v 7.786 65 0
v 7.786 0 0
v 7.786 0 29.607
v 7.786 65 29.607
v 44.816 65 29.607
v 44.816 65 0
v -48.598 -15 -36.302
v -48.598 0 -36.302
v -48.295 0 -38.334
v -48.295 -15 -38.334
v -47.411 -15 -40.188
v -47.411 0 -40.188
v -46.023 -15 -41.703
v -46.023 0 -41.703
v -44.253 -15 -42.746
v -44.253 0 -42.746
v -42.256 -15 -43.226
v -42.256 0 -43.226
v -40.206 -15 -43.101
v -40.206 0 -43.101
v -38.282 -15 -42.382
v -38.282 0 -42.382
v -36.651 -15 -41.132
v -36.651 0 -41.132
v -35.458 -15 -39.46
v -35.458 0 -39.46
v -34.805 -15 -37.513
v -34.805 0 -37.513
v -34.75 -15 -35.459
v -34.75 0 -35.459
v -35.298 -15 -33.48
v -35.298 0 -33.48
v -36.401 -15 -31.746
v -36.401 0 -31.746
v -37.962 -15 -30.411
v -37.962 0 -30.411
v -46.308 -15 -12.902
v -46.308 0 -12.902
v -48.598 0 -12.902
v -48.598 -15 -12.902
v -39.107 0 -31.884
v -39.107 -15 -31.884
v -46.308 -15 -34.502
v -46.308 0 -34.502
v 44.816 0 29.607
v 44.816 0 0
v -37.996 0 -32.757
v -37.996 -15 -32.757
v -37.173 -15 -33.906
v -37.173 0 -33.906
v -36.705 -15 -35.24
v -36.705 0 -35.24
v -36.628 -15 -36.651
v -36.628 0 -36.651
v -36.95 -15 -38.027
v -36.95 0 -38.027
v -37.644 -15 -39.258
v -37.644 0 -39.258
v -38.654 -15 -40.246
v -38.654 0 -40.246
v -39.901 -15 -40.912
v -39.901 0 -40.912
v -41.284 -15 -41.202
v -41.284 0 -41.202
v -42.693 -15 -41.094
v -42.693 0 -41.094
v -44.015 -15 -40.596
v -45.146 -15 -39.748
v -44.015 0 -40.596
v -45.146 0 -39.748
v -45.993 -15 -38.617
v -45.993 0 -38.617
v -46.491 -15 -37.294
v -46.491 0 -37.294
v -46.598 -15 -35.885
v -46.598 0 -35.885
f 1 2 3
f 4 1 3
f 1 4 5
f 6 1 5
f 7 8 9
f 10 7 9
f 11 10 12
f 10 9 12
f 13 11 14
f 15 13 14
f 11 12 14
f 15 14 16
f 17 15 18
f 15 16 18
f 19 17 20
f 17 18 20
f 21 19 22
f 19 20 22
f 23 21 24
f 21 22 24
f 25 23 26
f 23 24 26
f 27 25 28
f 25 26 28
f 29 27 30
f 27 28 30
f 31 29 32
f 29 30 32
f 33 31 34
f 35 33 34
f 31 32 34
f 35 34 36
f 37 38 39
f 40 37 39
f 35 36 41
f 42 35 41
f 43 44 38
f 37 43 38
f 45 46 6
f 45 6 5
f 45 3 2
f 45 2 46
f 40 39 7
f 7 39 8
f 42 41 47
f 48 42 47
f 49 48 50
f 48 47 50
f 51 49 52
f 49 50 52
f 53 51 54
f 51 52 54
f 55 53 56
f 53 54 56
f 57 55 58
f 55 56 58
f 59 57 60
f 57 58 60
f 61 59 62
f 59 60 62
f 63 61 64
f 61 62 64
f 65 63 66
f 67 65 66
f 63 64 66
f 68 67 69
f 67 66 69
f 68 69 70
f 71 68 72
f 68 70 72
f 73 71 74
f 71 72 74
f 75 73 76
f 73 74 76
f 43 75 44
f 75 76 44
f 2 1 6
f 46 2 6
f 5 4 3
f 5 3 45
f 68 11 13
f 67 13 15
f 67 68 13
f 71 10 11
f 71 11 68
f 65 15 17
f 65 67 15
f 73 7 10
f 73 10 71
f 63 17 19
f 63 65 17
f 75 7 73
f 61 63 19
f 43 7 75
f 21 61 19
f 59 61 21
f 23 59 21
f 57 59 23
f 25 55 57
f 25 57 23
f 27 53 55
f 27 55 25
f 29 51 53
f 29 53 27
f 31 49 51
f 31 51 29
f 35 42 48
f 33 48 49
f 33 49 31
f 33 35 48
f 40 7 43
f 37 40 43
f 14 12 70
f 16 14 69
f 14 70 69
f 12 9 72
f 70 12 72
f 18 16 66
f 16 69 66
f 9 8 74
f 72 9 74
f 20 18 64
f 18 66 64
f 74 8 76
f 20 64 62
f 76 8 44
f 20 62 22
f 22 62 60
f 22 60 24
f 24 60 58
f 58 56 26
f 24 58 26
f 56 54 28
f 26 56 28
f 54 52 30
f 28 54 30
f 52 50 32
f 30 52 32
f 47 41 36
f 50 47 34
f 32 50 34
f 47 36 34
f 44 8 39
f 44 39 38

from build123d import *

# Parameters (mm, degrees)
F1_DEPTH = 15
F3_W     = 37.029528
F3_H     = 29.607106
F2_DEPTH = 65


with BuildPart() as f1:
    # F0 (on Front) → F1 (new body)
    with BuildSketch(Plane.XZ):
        with BuildLine():
            Line((-46.307503, -12.901538), (-48.598494, -12.901538))
            Line((-48.598494, -12.901538), (-48.598494, -36.302392))
            ThreePointArc((-48.598494, -36.302392), (-38.281571, -42.381986), (-37.961742, -30.411269))
            Line((-37.961742, -30.411269), (-39.107237, -31.88405))
            ThreePointArc((-39.107237, -31.88405), (-39.900538, -40.91198), (-46.307503, -34.502328))
            Line((-46.307503, -34.502328), (-46.307503, -12.901538))
        make_face()
    extrude(amount=F1_DEPTH)


with BuildPart() as f2:
    # F3 (on Front) → F2 (new body)
    with BuildSketch(Plane.XZ):
        with Locations((26.300922, 14.803553)):
            Rectangle(F3_W, F3_H)
    extrude(amount=-F2_DEPTH)


solid = Compound([f1.part, f2.part])
